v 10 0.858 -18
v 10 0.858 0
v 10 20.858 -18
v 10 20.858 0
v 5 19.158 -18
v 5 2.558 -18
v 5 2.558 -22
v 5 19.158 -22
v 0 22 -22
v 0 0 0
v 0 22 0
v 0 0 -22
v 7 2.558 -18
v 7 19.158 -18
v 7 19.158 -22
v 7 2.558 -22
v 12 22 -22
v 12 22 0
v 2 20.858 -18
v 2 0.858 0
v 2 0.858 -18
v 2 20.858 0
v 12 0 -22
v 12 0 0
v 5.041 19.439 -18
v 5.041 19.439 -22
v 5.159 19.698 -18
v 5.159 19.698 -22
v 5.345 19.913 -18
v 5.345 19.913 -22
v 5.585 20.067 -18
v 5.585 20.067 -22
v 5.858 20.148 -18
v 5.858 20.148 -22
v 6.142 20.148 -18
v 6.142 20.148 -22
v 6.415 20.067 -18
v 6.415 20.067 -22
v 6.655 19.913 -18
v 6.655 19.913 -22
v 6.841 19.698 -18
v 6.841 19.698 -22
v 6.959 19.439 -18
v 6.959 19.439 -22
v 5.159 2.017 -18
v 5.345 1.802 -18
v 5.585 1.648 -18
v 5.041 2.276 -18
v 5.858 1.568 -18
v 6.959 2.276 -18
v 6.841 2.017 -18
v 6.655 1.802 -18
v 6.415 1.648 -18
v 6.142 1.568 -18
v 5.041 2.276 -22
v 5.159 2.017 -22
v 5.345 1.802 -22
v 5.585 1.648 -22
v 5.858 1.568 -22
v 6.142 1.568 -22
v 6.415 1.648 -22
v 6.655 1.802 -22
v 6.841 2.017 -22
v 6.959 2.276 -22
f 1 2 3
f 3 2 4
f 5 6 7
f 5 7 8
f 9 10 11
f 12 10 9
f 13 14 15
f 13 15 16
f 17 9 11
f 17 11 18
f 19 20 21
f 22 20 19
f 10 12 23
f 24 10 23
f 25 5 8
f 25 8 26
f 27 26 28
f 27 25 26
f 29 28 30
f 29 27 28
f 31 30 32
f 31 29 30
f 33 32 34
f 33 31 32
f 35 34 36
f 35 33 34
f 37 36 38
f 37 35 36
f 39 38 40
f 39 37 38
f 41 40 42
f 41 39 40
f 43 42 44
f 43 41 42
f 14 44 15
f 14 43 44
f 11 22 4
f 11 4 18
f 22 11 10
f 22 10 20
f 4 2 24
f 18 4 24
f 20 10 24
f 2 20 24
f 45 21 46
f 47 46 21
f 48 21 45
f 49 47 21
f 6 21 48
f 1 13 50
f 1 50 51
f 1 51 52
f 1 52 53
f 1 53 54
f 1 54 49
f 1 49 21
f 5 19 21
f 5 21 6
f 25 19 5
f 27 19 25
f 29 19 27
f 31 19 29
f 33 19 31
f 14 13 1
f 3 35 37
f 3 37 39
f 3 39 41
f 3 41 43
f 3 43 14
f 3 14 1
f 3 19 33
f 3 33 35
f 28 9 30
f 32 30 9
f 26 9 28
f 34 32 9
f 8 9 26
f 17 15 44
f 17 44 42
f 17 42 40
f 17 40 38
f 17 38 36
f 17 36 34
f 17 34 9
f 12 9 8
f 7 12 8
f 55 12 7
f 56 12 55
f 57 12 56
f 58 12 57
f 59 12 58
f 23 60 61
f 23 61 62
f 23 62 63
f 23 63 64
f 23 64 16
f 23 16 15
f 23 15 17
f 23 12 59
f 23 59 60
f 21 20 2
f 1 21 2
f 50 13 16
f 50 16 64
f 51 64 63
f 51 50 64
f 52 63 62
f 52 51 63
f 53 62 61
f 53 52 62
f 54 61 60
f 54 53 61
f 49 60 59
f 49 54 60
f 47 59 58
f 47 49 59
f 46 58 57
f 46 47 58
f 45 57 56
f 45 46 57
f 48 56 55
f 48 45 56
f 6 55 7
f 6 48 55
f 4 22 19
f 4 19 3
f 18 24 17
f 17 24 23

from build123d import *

# Parameters (mm, degrees)
SKETCH2_W           = 12
SKETCH2_H           = 22
BOSS_EXTRUDE1_DEPTH = 22
SKETCH4_W           = 8
SKETCH4_H           = 20
CUT_EXTRUDE1_DEPTH  = 18
CUT_EXTRUDE2_DEPTH  = 10


with BuildPart() as part:
    # Sketch2 → Boss-Extrude1 (new body)
    with BuildSketch(Plane(origin=(0, 0, 0), x_dir=(1, 0, 0), z_dir=(0, 1, 0))):
        with Locations((6, 11)):
            Rectangle(SKETCH2_W, SKETCH2_H)
    extrude(amount=BOSS_EXTRUDE1_DEPTH)

    # Sketch4 → Cut-Extrude1 (cut)
    with BuildSketch(Plane.XY):
        with Locations((6, 10.85774702)):
            Rectangle(SKETCH4_W, SKETCH4_H)
    extrude(amount=-CUT_EXTRUDE1_DEPTH, mode=Mode.SUBTRACT)

    # Sketch6 → Cut-Extrude2 (cut)
    with BuildSketch(Plane.XY.offset(-18)):
        with BuildLine():
            Line((5, 2.55774702), (5, 19.15774702))
            ThreePointArc((5, 19.15774702), (6, 20.15774702), (7, 19.15774702))
            Line((7, 19.15774702), (7, 2.55774702))
            ThreePointArc((7, 2.55774702), (6, 1.55774702), (5, 2.55774702))
        make_face()
    extrude(amount=-CUT_EXTRUDE2_DEPTH, mode=Mode.SUBTRACT)


solid = part.part
